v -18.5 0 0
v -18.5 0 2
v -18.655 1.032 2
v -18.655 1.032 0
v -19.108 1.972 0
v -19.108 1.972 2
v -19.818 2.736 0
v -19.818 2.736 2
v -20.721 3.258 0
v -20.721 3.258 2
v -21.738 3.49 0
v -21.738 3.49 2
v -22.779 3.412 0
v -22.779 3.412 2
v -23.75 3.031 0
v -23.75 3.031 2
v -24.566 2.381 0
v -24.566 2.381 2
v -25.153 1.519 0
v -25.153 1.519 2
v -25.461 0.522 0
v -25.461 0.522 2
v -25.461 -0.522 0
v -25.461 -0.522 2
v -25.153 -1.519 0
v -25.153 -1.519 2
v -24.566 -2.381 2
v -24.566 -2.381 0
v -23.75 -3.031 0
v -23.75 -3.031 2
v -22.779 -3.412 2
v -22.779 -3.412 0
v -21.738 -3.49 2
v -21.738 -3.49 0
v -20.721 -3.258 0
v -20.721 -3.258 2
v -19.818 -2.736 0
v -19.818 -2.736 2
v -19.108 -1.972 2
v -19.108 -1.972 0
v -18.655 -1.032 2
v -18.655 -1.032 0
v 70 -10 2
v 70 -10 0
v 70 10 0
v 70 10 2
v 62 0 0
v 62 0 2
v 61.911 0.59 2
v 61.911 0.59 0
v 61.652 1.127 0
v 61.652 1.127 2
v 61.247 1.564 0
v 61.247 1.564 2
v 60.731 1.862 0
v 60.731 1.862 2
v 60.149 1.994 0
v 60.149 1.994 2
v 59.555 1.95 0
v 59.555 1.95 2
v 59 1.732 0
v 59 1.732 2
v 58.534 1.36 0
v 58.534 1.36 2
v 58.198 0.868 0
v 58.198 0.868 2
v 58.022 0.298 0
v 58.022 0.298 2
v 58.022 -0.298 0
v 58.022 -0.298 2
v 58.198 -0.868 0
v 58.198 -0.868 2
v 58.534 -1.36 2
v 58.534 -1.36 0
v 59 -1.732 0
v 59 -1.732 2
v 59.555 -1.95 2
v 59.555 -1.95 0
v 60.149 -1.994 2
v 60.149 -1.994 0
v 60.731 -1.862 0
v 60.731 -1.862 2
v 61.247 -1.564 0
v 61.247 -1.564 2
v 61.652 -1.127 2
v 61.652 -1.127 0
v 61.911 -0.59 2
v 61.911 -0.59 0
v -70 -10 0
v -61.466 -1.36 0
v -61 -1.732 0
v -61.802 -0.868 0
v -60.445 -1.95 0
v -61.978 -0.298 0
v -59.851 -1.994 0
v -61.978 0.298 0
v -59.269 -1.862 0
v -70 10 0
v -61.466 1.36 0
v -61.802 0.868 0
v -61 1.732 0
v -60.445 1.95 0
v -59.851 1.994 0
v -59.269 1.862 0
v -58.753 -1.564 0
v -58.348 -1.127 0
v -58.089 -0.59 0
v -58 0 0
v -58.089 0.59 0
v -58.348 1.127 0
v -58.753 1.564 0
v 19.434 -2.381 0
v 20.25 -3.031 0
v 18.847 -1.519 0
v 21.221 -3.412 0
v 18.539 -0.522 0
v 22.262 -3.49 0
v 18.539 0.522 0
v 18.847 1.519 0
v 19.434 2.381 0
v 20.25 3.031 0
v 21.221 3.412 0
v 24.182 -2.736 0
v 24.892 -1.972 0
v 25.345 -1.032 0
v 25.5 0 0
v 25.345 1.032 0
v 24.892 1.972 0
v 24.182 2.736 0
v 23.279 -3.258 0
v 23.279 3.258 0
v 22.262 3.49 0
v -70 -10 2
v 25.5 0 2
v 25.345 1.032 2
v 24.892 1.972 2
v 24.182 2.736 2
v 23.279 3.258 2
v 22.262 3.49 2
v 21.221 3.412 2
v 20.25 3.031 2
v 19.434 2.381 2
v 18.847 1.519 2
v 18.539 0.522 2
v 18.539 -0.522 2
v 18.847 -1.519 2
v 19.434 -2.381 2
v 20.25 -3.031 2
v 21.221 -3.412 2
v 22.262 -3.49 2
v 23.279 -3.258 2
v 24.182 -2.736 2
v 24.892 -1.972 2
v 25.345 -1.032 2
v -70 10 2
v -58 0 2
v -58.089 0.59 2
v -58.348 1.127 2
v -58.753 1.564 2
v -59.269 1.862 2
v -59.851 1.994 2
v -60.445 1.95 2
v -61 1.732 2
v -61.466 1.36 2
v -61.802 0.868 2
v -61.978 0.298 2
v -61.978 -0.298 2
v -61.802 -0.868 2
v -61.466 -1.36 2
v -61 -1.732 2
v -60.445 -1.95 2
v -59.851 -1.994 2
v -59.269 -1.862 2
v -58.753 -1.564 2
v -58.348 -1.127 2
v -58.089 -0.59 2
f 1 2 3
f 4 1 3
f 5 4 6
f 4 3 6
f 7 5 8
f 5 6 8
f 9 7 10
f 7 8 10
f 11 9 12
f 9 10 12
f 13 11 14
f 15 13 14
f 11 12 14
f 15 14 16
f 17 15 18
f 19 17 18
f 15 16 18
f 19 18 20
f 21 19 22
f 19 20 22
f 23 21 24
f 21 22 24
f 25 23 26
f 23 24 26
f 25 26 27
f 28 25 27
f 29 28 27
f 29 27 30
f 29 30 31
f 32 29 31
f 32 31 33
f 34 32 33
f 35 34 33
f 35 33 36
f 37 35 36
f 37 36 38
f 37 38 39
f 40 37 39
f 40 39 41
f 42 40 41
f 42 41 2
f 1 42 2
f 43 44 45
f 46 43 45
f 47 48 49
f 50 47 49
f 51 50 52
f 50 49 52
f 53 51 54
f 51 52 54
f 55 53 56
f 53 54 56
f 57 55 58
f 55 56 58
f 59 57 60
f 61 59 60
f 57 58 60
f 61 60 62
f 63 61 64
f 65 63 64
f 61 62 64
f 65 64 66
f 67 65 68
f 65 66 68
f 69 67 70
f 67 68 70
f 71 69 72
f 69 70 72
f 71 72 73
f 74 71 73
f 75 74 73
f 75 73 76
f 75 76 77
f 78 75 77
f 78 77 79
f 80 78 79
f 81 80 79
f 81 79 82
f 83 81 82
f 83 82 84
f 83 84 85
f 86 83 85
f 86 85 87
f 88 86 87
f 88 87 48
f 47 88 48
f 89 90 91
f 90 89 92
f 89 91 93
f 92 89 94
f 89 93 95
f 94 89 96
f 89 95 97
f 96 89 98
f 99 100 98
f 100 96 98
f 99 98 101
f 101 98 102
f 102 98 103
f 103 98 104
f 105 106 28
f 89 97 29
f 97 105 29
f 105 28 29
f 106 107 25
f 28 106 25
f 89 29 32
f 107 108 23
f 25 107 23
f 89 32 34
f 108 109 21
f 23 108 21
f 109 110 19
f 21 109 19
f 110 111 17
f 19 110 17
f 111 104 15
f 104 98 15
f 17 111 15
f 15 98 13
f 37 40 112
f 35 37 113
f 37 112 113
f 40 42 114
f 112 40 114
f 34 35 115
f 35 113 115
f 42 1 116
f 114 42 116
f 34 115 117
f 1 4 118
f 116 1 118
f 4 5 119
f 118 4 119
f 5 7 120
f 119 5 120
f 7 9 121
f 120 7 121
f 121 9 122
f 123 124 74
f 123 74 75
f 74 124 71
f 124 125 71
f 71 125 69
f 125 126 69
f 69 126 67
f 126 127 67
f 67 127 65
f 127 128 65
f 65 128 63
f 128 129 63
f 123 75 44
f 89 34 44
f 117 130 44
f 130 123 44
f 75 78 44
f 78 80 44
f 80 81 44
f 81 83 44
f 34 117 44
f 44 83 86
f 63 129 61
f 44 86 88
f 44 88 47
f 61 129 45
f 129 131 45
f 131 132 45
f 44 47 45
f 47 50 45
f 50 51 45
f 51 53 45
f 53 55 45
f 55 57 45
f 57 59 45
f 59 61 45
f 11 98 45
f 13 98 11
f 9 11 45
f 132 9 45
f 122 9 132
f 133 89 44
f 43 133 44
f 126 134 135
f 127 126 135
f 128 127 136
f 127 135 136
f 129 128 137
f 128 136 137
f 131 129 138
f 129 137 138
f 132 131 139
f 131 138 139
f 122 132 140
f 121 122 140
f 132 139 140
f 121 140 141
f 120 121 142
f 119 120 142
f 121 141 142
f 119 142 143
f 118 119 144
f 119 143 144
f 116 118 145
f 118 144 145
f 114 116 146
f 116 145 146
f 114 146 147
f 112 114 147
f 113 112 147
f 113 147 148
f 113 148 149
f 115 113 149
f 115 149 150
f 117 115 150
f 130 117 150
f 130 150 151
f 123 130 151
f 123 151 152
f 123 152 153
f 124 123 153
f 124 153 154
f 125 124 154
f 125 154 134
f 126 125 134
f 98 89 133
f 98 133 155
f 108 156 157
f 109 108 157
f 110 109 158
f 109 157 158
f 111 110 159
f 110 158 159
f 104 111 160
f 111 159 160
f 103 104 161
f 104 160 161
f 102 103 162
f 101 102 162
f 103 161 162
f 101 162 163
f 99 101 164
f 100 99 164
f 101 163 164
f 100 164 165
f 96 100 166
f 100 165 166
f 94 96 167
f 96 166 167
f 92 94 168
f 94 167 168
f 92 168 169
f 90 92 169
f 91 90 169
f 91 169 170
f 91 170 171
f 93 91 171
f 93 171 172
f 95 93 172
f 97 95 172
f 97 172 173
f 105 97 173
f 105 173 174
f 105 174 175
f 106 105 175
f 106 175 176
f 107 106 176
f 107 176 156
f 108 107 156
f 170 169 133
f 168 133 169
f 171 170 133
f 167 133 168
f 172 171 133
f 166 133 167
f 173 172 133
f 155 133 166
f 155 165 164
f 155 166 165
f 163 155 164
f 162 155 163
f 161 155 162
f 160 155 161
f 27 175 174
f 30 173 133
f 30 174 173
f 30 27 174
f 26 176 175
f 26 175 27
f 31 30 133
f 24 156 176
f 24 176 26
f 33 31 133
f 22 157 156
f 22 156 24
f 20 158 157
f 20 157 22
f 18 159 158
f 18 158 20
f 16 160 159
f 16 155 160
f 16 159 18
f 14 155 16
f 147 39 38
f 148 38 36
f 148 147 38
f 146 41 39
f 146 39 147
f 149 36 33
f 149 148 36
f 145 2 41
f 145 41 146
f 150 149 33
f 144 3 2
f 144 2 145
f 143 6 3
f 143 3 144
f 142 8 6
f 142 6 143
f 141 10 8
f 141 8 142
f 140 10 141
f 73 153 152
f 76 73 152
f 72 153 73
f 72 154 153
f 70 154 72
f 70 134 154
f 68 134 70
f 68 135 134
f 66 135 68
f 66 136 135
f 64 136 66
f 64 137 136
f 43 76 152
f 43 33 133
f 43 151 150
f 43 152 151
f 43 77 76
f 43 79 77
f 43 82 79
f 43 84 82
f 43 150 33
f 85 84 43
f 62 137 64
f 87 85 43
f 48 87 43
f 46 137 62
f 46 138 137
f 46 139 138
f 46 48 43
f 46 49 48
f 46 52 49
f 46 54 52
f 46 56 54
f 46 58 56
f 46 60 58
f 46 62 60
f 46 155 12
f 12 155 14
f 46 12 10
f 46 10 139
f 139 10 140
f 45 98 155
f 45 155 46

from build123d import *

# Parameters (mm, degrees)
SKETCH1_W           = 140
SKETCH1_H           = 20
BOSS_EXTRUDE1_DEPTH = 2
SKETCH2_R           = 2
CUT_EXTRUDE1_DEPTH  = 3
CUT_EXTRUDE2_REACH  = 4
SKETCH3_R           = 3.5


with BuildPart() as part:
    # Sketch1 → Boss-Extrude1 (new body)
    with BuildSketch(Plane.XY):
        Rectangle(SKETCH1_W, SKETCH1_H)
    extrude(amount=BOSS_EXTRUDE1_DEPTH)

    # Sketch2 → Cut-Extrude1 (cut, through all)
    with BuildSketch(Plane.XY.offset(2)):
        with Locations((-60, 0)):
            Circle(SKETCH2_R)
        with Locations((60, 0)):
            Circle(SKETCH2_R)
    extrude(amount=-CUT_EXTRUDE1_DEPTH, mode=Mode.SUBTRACT)

    # Sketch3 → Cut-Extrude2 (cut, up to next)
    with BuildSketch(Plane.XY.offset(2), mode=Mode.PRIVATE) as cut_extrude2_sk1:
        with Locations((22, 0)):
            Circle(SKETCH3_R)
    cut_extrude2_tool1 = extrude(cut_extrude2_sk1.sketch, amount=-CUT_EXTRUDE2_REACH, mode=Mode.PRIVATE) & part.part
    add(cut_extrude2_tool1.solids().sort_by_distance((22, 0, 2))[0], mode=Mode.SUBTRACT)
    # Sketch3 → Cut-Extrude2 (cut, up to next)
    with BuildSketch(Plane.XY.offset(2), mode=Mode.PRIVATE) as cut_extrude2_sk2:
        with Locations((-22, 0)):
            Circle(SKETCH3_R)
    cut_extrude2_tool2 = extrude(cut_extrude2_sk2.sketch, amount=-CUT_EXTRUDE2_REACH, mode=Mode.PRIVATE) & part.part
    add(cut_extrude2_tool2.solids().sort_by_distance((-22, 0, 2))[0], mode=Mode.SUBTRACT)


solid = part.part
